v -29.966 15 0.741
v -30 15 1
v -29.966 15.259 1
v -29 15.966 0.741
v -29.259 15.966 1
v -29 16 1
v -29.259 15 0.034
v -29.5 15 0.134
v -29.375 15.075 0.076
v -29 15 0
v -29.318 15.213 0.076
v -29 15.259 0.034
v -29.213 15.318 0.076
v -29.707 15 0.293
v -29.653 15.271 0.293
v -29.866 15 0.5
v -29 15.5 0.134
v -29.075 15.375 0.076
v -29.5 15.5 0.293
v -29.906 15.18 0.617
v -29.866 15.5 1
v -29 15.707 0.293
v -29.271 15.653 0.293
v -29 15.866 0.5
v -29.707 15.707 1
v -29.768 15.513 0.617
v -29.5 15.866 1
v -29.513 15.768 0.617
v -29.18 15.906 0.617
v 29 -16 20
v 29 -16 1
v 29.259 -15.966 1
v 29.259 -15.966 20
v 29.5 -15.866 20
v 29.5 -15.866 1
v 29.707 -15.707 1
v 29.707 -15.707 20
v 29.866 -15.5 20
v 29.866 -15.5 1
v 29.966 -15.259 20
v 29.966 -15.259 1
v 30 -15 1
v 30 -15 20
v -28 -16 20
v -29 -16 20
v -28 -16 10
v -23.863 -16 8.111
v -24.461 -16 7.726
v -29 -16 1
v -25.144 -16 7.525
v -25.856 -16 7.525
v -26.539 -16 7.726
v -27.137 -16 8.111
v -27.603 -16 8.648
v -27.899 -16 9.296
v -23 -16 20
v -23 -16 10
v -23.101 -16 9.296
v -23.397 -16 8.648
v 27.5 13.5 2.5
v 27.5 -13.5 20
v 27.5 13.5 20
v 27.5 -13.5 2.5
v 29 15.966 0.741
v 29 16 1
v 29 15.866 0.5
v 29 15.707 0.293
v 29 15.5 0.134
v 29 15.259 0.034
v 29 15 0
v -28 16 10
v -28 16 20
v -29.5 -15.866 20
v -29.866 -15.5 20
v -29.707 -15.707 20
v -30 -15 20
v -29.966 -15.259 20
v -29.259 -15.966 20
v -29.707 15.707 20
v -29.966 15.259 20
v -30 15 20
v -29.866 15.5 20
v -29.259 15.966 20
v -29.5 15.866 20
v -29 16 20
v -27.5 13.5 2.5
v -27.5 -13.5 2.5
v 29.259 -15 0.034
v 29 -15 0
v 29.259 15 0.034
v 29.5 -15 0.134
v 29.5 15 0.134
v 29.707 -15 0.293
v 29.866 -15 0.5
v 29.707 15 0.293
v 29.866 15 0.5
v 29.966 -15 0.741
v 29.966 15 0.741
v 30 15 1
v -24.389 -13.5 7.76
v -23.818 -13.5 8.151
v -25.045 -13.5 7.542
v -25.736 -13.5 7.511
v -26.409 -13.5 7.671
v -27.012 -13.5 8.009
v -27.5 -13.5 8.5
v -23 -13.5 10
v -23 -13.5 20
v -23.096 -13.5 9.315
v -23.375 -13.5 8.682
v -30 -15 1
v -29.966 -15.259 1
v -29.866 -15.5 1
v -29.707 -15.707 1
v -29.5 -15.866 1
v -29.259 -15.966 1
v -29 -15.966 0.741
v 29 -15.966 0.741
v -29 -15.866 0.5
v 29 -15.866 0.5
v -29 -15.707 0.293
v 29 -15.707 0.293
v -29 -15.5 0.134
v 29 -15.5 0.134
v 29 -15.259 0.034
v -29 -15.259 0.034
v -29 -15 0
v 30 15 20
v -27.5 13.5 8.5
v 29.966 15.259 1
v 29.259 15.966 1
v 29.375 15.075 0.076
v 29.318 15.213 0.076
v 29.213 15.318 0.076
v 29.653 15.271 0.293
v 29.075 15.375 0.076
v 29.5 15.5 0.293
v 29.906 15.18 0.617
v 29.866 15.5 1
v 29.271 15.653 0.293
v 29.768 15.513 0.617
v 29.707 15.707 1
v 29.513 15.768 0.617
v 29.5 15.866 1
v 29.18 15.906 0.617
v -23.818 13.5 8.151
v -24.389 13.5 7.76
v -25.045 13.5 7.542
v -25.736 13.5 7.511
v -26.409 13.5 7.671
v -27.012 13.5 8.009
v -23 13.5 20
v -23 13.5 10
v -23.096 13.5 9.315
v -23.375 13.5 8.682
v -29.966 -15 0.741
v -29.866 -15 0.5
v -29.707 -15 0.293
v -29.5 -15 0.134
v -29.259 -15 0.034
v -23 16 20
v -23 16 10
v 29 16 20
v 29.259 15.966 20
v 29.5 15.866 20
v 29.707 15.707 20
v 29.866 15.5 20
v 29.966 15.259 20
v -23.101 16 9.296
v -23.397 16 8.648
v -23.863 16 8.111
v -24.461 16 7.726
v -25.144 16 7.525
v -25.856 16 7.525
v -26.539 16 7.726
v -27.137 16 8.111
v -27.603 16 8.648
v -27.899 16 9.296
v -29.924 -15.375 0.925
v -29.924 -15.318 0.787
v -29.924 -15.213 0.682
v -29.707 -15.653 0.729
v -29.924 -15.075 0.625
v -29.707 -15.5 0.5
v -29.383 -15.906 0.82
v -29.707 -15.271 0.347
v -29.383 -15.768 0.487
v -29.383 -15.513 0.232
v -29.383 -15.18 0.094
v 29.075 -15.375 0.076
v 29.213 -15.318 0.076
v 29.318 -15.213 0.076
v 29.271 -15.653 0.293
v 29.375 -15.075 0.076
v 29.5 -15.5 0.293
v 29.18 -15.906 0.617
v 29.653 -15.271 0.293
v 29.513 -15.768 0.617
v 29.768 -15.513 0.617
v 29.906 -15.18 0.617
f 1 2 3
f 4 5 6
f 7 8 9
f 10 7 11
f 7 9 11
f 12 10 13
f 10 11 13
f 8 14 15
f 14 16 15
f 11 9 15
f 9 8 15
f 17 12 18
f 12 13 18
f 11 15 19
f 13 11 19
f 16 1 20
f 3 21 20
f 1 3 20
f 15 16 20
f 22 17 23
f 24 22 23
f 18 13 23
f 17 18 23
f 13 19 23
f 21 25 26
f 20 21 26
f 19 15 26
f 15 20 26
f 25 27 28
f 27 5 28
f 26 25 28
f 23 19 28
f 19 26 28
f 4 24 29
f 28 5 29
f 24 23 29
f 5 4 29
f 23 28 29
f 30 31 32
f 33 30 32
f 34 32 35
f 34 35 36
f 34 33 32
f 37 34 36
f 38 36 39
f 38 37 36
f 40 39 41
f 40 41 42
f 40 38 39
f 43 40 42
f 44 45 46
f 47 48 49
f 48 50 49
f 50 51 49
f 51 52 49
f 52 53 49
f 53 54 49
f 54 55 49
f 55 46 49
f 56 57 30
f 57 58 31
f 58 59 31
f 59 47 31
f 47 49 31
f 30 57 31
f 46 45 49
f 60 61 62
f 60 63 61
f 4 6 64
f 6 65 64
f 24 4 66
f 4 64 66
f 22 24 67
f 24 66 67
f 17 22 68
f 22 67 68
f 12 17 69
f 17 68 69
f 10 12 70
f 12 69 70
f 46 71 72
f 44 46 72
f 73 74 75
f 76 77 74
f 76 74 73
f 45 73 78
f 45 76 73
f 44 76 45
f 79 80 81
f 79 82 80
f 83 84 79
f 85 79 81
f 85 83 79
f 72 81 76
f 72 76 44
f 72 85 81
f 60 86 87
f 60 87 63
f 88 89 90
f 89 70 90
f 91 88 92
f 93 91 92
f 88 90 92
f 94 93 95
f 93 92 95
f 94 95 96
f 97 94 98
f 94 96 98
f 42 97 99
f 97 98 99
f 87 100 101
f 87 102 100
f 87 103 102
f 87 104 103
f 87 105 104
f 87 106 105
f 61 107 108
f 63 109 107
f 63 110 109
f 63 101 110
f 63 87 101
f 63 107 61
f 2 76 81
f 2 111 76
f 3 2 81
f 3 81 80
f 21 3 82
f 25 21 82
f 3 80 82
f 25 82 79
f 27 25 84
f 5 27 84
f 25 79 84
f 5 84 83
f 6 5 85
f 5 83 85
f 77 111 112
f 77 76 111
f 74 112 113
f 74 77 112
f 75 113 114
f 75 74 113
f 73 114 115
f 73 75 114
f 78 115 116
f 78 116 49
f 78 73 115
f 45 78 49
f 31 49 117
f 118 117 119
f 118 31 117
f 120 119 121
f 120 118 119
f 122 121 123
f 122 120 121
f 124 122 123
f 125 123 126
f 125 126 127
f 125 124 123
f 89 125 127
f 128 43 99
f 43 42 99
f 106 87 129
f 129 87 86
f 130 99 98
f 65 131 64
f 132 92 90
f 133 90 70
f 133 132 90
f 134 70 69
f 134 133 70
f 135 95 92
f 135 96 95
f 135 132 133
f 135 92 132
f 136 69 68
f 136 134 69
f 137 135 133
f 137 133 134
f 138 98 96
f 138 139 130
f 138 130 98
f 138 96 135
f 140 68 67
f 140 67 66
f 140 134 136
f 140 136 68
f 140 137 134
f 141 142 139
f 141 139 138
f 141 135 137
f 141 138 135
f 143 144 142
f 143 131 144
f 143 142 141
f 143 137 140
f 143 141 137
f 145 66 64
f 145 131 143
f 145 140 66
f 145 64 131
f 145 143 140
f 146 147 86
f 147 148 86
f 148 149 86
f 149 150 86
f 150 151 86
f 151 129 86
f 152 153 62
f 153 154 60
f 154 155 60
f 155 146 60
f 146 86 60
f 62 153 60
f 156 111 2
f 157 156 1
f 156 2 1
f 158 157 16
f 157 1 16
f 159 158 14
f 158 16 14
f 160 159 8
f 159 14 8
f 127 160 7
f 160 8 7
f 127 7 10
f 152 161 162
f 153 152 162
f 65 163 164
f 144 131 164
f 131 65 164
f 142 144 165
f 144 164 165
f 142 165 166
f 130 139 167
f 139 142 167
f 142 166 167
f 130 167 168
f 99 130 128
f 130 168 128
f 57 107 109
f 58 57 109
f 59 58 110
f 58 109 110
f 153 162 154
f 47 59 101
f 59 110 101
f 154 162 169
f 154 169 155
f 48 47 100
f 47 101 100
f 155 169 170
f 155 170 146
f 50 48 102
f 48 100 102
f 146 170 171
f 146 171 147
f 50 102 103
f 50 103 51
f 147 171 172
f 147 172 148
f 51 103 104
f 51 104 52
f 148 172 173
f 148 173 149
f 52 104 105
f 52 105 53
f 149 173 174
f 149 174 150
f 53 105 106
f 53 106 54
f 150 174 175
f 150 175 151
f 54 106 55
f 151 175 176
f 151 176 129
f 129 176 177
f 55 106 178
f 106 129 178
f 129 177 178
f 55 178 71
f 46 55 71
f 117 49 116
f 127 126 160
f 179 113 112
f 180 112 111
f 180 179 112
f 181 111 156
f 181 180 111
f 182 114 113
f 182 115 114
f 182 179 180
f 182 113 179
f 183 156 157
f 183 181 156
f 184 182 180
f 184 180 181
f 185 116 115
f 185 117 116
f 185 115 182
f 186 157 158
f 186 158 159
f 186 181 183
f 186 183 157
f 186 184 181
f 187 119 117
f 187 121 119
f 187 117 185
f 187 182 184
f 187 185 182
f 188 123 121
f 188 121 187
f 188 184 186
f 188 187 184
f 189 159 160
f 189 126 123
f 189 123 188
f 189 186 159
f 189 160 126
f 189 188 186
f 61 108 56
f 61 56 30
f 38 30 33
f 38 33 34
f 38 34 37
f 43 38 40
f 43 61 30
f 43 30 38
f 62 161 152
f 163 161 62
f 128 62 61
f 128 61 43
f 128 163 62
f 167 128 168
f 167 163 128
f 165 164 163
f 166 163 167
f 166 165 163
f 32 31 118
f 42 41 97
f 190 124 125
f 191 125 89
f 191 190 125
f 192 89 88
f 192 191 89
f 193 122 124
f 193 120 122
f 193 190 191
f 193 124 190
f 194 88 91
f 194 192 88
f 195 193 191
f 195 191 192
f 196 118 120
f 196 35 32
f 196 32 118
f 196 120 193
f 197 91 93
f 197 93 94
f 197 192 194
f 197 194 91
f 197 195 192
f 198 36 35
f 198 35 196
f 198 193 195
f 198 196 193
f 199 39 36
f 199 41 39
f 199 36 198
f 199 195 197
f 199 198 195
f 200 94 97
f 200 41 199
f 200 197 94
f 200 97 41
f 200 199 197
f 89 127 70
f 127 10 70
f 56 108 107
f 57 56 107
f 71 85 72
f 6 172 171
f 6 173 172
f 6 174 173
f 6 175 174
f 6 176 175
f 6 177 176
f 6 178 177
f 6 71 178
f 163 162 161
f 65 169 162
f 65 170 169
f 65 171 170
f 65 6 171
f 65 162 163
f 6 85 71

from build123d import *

# Parameters (mm, degrees)
F0_W     = 60
F0_H     = 32
F1_DEPTH = 20
F2_T     = -2.5
F4_DEPTH = 32.001
F5_R     = 1


with BuildPart() as f1:
    # F0 (on Top) → F1 (new body)
    with BuildSketch(Plane.XY):
        Rectangle(F0_W, F0_H)
    extrude(amount=F1_DEPTH)

    # F2
    f2_openings = [f1.faces().sort_by_distance(p)[0] for p in [
        (0, 0, 20),
    ]]
    offset(amount=F2_T, openings=f2_openings)

    # F3 (on face) → F4 (cut, through all)
    with BuildSketch(Plane(origin=(0, 16, 0), x_dir=(-1, 0, 0), z_dir=(0, 1, 0))):
        with BuildLine():
            Line((23, 20), (23, 10))
            ThreePointArc((23, 10), (25.5, 7.5), (28, 10))
            Line((28, 10), (28, 20))
            Line((28, 20), (23, 20))
        make_face()
    extrude(amount=-F4_DEPTH, mode=Mode.SUBTRACT)

    # F5
    f5_edges = [f1.edges().sort_by_distance(p)[0] for p in [
        (30, -16, 10),
        (0, -16, 0),
        (30, 16, 10),
        (30, 0, 0),
        (-30, -16, 10),
        (-30, 16, 10),
        (-30, 0, 0),
        (0, 16, 0),
    ]]
    fillet(f5_edges, radius=F5_R)


solid = f1.part
